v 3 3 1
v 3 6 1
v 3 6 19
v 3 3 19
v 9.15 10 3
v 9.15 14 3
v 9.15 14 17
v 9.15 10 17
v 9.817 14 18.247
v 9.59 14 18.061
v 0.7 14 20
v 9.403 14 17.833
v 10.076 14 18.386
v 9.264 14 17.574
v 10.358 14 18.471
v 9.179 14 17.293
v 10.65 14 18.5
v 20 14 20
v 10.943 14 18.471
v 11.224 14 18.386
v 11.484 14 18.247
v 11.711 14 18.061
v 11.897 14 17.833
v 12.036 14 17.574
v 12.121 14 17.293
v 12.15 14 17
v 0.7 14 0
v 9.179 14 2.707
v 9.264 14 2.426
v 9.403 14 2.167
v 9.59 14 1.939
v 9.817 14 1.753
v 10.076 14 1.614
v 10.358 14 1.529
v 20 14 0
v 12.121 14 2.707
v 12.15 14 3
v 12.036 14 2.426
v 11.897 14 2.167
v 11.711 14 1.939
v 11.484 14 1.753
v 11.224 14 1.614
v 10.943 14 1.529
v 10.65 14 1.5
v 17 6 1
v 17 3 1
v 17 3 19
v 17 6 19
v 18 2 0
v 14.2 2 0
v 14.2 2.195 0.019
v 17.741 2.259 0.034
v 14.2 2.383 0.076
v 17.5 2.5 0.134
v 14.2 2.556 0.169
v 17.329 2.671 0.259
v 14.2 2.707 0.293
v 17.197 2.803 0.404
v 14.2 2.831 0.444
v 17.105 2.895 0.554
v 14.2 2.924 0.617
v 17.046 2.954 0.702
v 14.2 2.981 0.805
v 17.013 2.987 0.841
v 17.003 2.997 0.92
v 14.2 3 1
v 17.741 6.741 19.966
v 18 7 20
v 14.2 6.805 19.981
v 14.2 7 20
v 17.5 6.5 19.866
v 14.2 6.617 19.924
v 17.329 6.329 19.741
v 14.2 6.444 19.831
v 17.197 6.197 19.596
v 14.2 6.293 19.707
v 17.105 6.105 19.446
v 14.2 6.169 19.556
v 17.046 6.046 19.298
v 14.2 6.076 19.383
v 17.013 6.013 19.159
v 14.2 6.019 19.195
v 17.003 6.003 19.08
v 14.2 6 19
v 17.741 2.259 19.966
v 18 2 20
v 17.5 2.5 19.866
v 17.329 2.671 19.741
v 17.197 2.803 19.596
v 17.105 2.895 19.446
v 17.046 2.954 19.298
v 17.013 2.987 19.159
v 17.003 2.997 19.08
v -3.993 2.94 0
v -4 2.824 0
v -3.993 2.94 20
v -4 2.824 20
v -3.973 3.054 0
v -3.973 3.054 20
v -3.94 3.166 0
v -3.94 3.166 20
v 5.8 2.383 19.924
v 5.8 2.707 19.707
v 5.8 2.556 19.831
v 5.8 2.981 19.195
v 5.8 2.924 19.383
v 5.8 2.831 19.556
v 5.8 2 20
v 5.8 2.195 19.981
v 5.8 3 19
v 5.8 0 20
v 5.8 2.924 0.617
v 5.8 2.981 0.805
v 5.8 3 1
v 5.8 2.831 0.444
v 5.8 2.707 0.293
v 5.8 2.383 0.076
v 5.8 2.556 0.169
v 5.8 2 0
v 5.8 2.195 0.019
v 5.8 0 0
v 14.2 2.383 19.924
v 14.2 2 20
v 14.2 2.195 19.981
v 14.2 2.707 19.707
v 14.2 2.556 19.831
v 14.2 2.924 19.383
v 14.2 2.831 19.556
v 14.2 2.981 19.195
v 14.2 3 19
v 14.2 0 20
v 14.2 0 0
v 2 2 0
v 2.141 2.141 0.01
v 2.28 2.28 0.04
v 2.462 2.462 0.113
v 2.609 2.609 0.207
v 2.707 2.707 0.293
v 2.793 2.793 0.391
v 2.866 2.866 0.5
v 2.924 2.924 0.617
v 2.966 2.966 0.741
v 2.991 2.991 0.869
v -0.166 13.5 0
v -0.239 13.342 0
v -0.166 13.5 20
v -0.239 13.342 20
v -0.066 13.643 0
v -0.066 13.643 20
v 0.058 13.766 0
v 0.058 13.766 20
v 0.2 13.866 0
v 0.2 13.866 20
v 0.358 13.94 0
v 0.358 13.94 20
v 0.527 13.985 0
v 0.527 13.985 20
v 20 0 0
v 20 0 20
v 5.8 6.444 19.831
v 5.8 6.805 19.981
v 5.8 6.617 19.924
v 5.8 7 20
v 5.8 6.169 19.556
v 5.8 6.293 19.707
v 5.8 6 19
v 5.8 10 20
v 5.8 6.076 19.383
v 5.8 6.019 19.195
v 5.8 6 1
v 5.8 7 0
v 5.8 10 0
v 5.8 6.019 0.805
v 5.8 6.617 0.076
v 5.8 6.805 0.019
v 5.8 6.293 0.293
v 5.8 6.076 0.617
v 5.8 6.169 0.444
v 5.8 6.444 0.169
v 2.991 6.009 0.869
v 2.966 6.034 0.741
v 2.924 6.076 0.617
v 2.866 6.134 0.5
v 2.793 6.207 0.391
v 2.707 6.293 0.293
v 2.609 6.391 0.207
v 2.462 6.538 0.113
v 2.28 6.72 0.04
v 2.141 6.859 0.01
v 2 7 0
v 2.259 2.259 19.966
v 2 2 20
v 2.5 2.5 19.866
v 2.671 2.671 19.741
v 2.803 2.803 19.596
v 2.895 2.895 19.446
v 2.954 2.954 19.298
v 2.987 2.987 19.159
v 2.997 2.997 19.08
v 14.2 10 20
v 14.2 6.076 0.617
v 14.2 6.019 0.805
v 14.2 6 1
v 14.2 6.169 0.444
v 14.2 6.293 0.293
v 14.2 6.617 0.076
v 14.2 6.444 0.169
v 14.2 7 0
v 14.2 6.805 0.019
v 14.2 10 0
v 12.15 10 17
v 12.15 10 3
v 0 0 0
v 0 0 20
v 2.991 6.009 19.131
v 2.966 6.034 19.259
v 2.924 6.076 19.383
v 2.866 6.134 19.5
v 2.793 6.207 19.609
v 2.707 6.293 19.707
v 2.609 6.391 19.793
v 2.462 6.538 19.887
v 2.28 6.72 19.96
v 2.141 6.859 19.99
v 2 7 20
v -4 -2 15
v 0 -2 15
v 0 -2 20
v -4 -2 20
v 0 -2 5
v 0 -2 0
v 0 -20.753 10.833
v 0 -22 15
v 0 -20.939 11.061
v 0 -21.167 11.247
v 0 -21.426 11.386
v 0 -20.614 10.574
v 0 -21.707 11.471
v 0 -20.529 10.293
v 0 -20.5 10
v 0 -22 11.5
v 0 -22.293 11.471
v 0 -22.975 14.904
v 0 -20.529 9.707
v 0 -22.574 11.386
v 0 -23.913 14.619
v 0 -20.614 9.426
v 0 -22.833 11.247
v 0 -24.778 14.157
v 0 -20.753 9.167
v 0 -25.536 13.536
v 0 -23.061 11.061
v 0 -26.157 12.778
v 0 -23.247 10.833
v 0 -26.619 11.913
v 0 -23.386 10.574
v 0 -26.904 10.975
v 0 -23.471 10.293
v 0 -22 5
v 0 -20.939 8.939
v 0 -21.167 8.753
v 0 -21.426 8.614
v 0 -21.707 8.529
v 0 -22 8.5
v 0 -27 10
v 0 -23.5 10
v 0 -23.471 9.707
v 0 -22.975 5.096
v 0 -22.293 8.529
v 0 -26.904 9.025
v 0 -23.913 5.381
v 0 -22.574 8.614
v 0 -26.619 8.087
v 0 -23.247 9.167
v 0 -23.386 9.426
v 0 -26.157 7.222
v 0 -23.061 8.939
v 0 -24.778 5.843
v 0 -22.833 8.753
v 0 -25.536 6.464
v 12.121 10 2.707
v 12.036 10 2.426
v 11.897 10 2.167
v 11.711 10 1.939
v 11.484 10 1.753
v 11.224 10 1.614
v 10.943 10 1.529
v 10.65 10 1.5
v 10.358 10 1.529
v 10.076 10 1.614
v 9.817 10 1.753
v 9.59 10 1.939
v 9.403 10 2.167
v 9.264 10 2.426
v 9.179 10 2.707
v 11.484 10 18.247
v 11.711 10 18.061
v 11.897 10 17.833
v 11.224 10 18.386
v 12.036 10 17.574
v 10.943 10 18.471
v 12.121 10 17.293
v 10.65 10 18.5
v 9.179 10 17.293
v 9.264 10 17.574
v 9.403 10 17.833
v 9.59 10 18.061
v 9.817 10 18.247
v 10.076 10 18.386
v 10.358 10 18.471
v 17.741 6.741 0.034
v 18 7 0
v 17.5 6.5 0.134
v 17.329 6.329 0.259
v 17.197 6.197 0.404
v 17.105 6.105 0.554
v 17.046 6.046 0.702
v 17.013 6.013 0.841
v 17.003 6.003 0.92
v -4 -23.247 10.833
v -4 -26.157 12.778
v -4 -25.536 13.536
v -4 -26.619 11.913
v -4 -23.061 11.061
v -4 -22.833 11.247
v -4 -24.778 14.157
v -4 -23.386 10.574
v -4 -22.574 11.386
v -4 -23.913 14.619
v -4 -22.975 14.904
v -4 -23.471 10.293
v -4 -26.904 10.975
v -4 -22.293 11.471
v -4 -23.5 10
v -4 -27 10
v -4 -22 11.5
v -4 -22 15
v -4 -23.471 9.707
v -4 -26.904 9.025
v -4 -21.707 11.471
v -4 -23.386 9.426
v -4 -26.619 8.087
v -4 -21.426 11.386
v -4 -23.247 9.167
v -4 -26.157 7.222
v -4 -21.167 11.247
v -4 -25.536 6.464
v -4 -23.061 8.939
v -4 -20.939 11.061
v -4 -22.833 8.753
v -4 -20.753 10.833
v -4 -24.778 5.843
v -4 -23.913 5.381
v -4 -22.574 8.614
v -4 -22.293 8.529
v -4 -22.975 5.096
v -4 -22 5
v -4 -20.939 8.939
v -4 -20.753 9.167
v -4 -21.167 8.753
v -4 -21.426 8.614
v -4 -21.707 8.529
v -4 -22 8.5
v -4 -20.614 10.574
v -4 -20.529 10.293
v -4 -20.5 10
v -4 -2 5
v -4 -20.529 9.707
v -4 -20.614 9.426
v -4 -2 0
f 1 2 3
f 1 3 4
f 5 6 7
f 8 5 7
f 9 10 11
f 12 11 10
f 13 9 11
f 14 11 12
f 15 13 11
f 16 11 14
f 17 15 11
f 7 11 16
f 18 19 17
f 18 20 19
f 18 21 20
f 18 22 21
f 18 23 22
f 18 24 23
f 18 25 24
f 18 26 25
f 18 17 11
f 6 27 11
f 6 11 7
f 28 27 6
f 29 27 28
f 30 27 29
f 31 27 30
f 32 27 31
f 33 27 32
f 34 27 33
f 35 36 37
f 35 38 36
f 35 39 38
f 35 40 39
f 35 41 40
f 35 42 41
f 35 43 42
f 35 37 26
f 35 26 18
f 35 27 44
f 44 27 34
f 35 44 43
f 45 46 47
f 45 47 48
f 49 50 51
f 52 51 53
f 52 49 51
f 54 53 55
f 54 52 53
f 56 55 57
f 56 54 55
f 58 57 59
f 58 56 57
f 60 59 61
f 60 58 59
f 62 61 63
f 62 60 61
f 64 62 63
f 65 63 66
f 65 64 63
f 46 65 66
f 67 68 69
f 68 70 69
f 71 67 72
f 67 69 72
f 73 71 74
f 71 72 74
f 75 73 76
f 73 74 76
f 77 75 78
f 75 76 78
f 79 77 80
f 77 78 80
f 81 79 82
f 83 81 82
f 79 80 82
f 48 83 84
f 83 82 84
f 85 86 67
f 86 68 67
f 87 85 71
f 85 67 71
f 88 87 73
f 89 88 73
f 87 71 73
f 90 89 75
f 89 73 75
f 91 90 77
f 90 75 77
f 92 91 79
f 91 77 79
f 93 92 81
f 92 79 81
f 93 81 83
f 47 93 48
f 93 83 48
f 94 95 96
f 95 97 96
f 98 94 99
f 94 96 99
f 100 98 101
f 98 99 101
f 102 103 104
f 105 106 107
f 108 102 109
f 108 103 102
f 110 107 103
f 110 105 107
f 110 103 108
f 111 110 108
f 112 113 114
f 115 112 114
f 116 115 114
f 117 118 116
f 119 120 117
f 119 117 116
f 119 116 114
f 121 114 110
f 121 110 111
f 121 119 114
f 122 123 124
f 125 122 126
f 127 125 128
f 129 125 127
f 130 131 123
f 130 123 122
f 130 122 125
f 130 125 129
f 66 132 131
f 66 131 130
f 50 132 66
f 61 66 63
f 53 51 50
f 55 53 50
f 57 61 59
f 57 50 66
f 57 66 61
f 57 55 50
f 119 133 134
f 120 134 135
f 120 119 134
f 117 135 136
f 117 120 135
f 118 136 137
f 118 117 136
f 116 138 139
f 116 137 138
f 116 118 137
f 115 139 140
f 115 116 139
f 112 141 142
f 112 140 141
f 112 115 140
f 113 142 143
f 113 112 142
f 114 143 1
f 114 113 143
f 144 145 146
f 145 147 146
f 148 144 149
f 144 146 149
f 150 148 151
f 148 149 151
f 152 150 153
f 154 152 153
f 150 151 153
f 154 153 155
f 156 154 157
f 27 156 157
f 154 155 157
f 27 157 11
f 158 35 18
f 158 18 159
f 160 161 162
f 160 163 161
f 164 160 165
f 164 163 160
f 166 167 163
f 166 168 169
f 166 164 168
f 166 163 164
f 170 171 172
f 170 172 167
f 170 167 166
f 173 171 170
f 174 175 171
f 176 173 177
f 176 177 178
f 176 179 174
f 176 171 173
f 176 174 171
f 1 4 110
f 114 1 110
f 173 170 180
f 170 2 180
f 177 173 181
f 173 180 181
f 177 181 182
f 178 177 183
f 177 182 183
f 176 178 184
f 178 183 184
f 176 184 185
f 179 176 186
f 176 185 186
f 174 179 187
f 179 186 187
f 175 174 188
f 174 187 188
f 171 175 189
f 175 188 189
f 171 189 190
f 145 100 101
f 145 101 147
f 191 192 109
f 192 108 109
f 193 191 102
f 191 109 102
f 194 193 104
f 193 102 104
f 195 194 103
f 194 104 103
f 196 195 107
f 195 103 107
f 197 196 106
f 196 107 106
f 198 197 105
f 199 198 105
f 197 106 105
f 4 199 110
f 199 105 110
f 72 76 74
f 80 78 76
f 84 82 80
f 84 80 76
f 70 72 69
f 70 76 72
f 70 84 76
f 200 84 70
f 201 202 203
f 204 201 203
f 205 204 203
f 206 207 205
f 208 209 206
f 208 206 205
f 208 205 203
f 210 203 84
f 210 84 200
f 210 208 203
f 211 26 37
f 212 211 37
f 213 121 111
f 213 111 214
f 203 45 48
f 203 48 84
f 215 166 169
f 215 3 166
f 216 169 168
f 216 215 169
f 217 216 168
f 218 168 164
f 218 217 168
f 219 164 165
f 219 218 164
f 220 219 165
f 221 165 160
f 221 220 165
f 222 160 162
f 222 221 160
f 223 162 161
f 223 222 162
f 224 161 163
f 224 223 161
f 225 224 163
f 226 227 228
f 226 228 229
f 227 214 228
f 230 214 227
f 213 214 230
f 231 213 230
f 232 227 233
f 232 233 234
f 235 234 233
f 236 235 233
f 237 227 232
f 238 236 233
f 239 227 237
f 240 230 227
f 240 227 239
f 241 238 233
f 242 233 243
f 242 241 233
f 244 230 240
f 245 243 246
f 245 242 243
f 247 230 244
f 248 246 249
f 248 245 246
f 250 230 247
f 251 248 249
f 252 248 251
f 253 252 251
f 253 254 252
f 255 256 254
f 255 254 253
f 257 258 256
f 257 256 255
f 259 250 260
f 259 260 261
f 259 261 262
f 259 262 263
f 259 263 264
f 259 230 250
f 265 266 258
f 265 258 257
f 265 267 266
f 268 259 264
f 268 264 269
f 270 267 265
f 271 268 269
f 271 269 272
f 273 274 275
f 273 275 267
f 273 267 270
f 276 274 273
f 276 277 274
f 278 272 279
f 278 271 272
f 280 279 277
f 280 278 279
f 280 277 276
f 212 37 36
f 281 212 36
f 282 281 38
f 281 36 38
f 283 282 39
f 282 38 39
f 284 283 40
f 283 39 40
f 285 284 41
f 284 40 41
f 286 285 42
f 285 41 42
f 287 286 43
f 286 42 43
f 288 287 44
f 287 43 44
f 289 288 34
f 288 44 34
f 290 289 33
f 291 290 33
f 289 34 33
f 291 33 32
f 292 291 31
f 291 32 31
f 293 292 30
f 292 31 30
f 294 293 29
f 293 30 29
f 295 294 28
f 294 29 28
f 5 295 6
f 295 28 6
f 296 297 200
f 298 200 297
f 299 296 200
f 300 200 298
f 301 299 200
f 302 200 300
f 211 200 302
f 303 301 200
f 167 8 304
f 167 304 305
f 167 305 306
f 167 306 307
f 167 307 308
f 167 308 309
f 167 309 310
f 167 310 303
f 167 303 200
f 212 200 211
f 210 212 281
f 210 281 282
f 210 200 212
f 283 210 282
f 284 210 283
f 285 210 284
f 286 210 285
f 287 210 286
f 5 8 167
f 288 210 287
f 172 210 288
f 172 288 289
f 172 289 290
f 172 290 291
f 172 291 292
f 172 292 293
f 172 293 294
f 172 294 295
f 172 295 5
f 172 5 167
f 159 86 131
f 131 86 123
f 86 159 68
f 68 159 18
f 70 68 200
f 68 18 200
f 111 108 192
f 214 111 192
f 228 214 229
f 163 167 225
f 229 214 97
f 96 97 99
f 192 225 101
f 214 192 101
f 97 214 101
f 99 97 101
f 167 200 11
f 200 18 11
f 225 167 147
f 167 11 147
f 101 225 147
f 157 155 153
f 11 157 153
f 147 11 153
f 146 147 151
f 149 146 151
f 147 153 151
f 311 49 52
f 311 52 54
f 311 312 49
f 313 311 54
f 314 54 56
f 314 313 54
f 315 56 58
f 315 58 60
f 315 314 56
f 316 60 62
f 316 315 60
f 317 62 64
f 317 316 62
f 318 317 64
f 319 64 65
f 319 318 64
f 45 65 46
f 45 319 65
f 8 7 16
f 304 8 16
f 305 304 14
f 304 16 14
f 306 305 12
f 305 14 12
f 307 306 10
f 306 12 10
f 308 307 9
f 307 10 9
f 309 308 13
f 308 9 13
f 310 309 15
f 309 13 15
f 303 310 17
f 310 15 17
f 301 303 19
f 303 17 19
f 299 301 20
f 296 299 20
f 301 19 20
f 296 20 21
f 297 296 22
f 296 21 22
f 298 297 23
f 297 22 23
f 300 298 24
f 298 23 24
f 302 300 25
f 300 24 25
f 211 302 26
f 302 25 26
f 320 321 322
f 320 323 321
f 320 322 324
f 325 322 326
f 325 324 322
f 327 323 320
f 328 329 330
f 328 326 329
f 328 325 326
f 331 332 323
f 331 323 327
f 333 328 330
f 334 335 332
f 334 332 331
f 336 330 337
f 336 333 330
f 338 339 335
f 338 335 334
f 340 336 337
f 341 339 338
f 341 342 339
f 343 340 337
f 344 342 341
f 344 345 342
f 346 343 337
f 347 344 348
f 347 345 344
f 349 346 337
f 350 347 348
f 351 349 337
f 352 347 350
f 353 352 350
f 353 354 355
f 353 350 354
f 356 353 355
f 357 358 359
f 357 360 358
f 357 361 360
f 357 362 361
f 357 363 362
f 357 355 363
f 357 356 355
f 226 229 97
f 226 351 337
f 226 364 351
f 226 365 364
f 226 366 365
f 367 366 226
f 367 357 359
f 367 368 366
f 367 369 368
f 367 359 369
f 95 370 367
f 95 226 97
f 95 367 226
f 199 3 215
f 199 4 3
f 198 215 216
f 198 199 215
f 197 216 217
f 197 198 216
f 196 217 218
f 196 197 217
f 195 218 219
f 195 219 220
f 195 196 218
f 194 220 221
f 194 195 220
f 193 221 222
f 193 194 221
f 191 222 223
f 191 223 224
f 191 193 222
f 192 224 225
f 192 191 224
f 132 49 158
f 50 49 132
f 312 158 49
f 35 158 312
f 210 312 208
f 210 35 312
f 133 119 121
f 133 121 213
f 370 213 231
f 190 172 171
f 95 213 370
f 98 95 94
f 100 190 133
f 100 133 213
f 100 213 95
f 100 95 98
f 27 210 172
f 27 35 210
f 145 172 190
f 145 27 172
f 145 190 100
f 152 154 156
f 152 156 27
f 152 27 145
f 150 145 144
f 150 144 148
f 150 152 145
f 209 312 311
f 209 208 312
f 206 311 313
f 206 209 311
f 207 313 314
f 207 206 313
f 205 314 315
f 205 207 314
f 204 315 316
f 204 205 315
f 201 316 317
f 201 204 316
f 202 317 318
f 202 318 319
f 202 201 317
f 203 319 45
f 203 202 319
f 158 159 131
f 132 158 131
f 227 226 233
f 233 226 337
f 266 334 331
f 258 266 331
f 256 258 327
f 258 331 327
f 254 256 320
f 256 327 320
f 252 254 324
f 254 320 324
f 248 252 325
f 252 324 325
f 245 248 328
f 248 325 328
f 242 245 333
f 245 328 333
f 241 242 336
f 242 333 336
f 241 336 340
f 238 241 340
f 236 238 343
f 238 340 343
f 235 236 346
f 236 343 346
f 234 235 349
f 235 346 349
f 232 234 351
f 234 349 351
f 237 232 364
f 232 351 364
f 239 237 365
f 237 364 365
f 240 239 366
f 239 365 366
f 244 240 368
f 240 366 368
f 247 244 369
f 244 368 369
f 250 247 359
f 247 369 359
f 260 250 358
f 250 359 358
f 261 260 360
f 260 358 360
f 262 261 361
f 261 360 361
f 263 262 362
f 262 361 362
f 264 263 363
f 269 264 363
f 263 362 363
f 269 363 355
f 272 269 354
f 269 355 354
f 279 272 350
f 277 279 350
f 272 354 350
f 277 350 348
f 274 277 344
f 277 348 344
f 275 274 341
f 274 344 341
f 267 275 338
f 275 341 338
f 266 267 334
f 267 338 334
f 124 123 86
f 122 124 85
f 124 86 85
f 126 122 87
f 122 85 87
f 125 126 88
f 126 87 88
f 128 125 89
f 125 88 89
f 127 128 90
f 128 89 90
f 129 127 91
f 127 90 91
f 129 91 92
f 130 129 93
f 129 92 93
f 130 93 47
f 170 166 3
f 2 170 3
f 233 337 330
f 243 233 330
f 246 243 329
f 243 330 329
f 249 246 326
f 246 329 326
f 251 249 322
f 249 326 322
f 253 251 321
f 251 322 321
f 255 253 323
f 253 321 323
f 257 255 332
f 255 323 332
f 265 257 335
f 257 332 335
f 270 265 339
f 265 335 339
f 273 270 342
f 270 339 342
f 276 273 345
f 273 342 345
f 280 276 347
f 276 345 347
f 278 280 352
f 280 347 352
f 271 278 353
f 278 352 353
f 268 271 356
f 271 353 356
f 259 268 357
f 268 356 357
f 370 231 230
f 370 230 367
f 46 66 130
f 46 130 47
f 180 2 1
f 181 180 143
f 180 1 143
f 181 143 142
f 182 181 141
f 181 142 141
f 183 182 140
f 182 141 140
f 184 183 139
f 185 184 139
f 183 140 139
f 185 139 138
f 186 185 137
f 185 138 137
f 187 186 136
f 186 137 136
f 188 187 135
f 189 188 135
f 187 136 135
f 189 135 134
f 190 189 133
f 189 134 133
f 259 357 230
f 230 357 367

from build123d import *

# Parameters (mm, degrees)
EXTRUDE_1_DEPTH     = 20
SKETCH_2_R          = 1.5
EXTRUDE_2_DEPTH     = 4
FILLET_6_R          = 1
CUT_EXTRUDE_1_REACH = 51.81


with BuildPart() as part:
    # 草图1 → 凸台-拉伸1 (new body)
    with BuildSketch(Plane.XY):
        Polygon((5.8, 6), (3, 6), (3, 3), (5.8, 3), (5.8, 0), (0, 0), (0, -2), (-4, -2), (-4, 3), (0, 14), (20, 14), (20, 0), (14.2, 0), (14.2, 3), (17, 3), (17, 6), (14.2, 6), (14.2, 10), (5.8, 10), align=None)
    extrude(amount=EXTRUDE_1_DEPTH)

    # 草图2 → 凸台-拉伸2 (add)
    with BuildSketch(Plane.ZY.offset(4)):
        with BuildLine():
            Line((5, -2), (15, -2))
            Line((15, -2), (15, -22))
            ThreePointArc((15, -22), (10, -27), (5, -22))
            Line((5, -22), (5, -2))
        make_face()
        with Locations(Location((10, -22, 0), (0, 0, 270))):
            Circle(SKETCH_2_R, mode=Mode.SUBTRACT)
    extrude(amount=-EXTRUDE_2_DEPTH)

    # 圆角6
    fillet_6_edges = [part.edges().sort_by_distance(p)[0] for p in [
        (4.4, 3, 20),
        (3, 4.5, 20),
        (15.6, 3, 0),
        (17, 4.5, 0),
        (15.6, 6, 0),
        (4.4, 6, 0),
        (3, 4.5, 0),
        (4.4, 3, 0),
        (4.4, 6, 20),
        (-4, 3, 10),
        (0, 14, 10),
        (15.6, 6, 20),
        (17, 4.5, 20),
        (15.6, 3, 20),
    ]]
    fillet(fillet_6_edges, radius=FILLET_6_R)

    # 草图3 → 切除-拉伸1 (cut, up to next)
    with BuildSketch(Plane(origin=(0, 14, 0), x_dir=(1, 0, 0), z_dir=(0, 1, 0)), mode=Mode.PRIVATE) as cut_extrude_1_sk1:
        with BuildLine():
            Line((9.150213632, -3), (9.150213632, -17))
            ThreePointArc((9.150213632, -17), (10.650213632, -18.5), (12.150213632, -17))
            Line((12.150213632, -17), (12.150213632, -3))
            ThreePointArc((12.150213632, -3), (10.650213632, -1.5), (9.150213632, -3))
        make_face()
    cut_extrude_1_tool1 = extrude(cut_extrude_1_sk1.sketch, amount=-CUT_EXTRUDE_1_REACH, mode=Mode.PRIVATE) & part.part
    add(cut_extrude_1_tool1.solids().sort_by_distance((10.650214, 14, 10))[0], mode=Mode.SUBTRACT)


solid = part.part
